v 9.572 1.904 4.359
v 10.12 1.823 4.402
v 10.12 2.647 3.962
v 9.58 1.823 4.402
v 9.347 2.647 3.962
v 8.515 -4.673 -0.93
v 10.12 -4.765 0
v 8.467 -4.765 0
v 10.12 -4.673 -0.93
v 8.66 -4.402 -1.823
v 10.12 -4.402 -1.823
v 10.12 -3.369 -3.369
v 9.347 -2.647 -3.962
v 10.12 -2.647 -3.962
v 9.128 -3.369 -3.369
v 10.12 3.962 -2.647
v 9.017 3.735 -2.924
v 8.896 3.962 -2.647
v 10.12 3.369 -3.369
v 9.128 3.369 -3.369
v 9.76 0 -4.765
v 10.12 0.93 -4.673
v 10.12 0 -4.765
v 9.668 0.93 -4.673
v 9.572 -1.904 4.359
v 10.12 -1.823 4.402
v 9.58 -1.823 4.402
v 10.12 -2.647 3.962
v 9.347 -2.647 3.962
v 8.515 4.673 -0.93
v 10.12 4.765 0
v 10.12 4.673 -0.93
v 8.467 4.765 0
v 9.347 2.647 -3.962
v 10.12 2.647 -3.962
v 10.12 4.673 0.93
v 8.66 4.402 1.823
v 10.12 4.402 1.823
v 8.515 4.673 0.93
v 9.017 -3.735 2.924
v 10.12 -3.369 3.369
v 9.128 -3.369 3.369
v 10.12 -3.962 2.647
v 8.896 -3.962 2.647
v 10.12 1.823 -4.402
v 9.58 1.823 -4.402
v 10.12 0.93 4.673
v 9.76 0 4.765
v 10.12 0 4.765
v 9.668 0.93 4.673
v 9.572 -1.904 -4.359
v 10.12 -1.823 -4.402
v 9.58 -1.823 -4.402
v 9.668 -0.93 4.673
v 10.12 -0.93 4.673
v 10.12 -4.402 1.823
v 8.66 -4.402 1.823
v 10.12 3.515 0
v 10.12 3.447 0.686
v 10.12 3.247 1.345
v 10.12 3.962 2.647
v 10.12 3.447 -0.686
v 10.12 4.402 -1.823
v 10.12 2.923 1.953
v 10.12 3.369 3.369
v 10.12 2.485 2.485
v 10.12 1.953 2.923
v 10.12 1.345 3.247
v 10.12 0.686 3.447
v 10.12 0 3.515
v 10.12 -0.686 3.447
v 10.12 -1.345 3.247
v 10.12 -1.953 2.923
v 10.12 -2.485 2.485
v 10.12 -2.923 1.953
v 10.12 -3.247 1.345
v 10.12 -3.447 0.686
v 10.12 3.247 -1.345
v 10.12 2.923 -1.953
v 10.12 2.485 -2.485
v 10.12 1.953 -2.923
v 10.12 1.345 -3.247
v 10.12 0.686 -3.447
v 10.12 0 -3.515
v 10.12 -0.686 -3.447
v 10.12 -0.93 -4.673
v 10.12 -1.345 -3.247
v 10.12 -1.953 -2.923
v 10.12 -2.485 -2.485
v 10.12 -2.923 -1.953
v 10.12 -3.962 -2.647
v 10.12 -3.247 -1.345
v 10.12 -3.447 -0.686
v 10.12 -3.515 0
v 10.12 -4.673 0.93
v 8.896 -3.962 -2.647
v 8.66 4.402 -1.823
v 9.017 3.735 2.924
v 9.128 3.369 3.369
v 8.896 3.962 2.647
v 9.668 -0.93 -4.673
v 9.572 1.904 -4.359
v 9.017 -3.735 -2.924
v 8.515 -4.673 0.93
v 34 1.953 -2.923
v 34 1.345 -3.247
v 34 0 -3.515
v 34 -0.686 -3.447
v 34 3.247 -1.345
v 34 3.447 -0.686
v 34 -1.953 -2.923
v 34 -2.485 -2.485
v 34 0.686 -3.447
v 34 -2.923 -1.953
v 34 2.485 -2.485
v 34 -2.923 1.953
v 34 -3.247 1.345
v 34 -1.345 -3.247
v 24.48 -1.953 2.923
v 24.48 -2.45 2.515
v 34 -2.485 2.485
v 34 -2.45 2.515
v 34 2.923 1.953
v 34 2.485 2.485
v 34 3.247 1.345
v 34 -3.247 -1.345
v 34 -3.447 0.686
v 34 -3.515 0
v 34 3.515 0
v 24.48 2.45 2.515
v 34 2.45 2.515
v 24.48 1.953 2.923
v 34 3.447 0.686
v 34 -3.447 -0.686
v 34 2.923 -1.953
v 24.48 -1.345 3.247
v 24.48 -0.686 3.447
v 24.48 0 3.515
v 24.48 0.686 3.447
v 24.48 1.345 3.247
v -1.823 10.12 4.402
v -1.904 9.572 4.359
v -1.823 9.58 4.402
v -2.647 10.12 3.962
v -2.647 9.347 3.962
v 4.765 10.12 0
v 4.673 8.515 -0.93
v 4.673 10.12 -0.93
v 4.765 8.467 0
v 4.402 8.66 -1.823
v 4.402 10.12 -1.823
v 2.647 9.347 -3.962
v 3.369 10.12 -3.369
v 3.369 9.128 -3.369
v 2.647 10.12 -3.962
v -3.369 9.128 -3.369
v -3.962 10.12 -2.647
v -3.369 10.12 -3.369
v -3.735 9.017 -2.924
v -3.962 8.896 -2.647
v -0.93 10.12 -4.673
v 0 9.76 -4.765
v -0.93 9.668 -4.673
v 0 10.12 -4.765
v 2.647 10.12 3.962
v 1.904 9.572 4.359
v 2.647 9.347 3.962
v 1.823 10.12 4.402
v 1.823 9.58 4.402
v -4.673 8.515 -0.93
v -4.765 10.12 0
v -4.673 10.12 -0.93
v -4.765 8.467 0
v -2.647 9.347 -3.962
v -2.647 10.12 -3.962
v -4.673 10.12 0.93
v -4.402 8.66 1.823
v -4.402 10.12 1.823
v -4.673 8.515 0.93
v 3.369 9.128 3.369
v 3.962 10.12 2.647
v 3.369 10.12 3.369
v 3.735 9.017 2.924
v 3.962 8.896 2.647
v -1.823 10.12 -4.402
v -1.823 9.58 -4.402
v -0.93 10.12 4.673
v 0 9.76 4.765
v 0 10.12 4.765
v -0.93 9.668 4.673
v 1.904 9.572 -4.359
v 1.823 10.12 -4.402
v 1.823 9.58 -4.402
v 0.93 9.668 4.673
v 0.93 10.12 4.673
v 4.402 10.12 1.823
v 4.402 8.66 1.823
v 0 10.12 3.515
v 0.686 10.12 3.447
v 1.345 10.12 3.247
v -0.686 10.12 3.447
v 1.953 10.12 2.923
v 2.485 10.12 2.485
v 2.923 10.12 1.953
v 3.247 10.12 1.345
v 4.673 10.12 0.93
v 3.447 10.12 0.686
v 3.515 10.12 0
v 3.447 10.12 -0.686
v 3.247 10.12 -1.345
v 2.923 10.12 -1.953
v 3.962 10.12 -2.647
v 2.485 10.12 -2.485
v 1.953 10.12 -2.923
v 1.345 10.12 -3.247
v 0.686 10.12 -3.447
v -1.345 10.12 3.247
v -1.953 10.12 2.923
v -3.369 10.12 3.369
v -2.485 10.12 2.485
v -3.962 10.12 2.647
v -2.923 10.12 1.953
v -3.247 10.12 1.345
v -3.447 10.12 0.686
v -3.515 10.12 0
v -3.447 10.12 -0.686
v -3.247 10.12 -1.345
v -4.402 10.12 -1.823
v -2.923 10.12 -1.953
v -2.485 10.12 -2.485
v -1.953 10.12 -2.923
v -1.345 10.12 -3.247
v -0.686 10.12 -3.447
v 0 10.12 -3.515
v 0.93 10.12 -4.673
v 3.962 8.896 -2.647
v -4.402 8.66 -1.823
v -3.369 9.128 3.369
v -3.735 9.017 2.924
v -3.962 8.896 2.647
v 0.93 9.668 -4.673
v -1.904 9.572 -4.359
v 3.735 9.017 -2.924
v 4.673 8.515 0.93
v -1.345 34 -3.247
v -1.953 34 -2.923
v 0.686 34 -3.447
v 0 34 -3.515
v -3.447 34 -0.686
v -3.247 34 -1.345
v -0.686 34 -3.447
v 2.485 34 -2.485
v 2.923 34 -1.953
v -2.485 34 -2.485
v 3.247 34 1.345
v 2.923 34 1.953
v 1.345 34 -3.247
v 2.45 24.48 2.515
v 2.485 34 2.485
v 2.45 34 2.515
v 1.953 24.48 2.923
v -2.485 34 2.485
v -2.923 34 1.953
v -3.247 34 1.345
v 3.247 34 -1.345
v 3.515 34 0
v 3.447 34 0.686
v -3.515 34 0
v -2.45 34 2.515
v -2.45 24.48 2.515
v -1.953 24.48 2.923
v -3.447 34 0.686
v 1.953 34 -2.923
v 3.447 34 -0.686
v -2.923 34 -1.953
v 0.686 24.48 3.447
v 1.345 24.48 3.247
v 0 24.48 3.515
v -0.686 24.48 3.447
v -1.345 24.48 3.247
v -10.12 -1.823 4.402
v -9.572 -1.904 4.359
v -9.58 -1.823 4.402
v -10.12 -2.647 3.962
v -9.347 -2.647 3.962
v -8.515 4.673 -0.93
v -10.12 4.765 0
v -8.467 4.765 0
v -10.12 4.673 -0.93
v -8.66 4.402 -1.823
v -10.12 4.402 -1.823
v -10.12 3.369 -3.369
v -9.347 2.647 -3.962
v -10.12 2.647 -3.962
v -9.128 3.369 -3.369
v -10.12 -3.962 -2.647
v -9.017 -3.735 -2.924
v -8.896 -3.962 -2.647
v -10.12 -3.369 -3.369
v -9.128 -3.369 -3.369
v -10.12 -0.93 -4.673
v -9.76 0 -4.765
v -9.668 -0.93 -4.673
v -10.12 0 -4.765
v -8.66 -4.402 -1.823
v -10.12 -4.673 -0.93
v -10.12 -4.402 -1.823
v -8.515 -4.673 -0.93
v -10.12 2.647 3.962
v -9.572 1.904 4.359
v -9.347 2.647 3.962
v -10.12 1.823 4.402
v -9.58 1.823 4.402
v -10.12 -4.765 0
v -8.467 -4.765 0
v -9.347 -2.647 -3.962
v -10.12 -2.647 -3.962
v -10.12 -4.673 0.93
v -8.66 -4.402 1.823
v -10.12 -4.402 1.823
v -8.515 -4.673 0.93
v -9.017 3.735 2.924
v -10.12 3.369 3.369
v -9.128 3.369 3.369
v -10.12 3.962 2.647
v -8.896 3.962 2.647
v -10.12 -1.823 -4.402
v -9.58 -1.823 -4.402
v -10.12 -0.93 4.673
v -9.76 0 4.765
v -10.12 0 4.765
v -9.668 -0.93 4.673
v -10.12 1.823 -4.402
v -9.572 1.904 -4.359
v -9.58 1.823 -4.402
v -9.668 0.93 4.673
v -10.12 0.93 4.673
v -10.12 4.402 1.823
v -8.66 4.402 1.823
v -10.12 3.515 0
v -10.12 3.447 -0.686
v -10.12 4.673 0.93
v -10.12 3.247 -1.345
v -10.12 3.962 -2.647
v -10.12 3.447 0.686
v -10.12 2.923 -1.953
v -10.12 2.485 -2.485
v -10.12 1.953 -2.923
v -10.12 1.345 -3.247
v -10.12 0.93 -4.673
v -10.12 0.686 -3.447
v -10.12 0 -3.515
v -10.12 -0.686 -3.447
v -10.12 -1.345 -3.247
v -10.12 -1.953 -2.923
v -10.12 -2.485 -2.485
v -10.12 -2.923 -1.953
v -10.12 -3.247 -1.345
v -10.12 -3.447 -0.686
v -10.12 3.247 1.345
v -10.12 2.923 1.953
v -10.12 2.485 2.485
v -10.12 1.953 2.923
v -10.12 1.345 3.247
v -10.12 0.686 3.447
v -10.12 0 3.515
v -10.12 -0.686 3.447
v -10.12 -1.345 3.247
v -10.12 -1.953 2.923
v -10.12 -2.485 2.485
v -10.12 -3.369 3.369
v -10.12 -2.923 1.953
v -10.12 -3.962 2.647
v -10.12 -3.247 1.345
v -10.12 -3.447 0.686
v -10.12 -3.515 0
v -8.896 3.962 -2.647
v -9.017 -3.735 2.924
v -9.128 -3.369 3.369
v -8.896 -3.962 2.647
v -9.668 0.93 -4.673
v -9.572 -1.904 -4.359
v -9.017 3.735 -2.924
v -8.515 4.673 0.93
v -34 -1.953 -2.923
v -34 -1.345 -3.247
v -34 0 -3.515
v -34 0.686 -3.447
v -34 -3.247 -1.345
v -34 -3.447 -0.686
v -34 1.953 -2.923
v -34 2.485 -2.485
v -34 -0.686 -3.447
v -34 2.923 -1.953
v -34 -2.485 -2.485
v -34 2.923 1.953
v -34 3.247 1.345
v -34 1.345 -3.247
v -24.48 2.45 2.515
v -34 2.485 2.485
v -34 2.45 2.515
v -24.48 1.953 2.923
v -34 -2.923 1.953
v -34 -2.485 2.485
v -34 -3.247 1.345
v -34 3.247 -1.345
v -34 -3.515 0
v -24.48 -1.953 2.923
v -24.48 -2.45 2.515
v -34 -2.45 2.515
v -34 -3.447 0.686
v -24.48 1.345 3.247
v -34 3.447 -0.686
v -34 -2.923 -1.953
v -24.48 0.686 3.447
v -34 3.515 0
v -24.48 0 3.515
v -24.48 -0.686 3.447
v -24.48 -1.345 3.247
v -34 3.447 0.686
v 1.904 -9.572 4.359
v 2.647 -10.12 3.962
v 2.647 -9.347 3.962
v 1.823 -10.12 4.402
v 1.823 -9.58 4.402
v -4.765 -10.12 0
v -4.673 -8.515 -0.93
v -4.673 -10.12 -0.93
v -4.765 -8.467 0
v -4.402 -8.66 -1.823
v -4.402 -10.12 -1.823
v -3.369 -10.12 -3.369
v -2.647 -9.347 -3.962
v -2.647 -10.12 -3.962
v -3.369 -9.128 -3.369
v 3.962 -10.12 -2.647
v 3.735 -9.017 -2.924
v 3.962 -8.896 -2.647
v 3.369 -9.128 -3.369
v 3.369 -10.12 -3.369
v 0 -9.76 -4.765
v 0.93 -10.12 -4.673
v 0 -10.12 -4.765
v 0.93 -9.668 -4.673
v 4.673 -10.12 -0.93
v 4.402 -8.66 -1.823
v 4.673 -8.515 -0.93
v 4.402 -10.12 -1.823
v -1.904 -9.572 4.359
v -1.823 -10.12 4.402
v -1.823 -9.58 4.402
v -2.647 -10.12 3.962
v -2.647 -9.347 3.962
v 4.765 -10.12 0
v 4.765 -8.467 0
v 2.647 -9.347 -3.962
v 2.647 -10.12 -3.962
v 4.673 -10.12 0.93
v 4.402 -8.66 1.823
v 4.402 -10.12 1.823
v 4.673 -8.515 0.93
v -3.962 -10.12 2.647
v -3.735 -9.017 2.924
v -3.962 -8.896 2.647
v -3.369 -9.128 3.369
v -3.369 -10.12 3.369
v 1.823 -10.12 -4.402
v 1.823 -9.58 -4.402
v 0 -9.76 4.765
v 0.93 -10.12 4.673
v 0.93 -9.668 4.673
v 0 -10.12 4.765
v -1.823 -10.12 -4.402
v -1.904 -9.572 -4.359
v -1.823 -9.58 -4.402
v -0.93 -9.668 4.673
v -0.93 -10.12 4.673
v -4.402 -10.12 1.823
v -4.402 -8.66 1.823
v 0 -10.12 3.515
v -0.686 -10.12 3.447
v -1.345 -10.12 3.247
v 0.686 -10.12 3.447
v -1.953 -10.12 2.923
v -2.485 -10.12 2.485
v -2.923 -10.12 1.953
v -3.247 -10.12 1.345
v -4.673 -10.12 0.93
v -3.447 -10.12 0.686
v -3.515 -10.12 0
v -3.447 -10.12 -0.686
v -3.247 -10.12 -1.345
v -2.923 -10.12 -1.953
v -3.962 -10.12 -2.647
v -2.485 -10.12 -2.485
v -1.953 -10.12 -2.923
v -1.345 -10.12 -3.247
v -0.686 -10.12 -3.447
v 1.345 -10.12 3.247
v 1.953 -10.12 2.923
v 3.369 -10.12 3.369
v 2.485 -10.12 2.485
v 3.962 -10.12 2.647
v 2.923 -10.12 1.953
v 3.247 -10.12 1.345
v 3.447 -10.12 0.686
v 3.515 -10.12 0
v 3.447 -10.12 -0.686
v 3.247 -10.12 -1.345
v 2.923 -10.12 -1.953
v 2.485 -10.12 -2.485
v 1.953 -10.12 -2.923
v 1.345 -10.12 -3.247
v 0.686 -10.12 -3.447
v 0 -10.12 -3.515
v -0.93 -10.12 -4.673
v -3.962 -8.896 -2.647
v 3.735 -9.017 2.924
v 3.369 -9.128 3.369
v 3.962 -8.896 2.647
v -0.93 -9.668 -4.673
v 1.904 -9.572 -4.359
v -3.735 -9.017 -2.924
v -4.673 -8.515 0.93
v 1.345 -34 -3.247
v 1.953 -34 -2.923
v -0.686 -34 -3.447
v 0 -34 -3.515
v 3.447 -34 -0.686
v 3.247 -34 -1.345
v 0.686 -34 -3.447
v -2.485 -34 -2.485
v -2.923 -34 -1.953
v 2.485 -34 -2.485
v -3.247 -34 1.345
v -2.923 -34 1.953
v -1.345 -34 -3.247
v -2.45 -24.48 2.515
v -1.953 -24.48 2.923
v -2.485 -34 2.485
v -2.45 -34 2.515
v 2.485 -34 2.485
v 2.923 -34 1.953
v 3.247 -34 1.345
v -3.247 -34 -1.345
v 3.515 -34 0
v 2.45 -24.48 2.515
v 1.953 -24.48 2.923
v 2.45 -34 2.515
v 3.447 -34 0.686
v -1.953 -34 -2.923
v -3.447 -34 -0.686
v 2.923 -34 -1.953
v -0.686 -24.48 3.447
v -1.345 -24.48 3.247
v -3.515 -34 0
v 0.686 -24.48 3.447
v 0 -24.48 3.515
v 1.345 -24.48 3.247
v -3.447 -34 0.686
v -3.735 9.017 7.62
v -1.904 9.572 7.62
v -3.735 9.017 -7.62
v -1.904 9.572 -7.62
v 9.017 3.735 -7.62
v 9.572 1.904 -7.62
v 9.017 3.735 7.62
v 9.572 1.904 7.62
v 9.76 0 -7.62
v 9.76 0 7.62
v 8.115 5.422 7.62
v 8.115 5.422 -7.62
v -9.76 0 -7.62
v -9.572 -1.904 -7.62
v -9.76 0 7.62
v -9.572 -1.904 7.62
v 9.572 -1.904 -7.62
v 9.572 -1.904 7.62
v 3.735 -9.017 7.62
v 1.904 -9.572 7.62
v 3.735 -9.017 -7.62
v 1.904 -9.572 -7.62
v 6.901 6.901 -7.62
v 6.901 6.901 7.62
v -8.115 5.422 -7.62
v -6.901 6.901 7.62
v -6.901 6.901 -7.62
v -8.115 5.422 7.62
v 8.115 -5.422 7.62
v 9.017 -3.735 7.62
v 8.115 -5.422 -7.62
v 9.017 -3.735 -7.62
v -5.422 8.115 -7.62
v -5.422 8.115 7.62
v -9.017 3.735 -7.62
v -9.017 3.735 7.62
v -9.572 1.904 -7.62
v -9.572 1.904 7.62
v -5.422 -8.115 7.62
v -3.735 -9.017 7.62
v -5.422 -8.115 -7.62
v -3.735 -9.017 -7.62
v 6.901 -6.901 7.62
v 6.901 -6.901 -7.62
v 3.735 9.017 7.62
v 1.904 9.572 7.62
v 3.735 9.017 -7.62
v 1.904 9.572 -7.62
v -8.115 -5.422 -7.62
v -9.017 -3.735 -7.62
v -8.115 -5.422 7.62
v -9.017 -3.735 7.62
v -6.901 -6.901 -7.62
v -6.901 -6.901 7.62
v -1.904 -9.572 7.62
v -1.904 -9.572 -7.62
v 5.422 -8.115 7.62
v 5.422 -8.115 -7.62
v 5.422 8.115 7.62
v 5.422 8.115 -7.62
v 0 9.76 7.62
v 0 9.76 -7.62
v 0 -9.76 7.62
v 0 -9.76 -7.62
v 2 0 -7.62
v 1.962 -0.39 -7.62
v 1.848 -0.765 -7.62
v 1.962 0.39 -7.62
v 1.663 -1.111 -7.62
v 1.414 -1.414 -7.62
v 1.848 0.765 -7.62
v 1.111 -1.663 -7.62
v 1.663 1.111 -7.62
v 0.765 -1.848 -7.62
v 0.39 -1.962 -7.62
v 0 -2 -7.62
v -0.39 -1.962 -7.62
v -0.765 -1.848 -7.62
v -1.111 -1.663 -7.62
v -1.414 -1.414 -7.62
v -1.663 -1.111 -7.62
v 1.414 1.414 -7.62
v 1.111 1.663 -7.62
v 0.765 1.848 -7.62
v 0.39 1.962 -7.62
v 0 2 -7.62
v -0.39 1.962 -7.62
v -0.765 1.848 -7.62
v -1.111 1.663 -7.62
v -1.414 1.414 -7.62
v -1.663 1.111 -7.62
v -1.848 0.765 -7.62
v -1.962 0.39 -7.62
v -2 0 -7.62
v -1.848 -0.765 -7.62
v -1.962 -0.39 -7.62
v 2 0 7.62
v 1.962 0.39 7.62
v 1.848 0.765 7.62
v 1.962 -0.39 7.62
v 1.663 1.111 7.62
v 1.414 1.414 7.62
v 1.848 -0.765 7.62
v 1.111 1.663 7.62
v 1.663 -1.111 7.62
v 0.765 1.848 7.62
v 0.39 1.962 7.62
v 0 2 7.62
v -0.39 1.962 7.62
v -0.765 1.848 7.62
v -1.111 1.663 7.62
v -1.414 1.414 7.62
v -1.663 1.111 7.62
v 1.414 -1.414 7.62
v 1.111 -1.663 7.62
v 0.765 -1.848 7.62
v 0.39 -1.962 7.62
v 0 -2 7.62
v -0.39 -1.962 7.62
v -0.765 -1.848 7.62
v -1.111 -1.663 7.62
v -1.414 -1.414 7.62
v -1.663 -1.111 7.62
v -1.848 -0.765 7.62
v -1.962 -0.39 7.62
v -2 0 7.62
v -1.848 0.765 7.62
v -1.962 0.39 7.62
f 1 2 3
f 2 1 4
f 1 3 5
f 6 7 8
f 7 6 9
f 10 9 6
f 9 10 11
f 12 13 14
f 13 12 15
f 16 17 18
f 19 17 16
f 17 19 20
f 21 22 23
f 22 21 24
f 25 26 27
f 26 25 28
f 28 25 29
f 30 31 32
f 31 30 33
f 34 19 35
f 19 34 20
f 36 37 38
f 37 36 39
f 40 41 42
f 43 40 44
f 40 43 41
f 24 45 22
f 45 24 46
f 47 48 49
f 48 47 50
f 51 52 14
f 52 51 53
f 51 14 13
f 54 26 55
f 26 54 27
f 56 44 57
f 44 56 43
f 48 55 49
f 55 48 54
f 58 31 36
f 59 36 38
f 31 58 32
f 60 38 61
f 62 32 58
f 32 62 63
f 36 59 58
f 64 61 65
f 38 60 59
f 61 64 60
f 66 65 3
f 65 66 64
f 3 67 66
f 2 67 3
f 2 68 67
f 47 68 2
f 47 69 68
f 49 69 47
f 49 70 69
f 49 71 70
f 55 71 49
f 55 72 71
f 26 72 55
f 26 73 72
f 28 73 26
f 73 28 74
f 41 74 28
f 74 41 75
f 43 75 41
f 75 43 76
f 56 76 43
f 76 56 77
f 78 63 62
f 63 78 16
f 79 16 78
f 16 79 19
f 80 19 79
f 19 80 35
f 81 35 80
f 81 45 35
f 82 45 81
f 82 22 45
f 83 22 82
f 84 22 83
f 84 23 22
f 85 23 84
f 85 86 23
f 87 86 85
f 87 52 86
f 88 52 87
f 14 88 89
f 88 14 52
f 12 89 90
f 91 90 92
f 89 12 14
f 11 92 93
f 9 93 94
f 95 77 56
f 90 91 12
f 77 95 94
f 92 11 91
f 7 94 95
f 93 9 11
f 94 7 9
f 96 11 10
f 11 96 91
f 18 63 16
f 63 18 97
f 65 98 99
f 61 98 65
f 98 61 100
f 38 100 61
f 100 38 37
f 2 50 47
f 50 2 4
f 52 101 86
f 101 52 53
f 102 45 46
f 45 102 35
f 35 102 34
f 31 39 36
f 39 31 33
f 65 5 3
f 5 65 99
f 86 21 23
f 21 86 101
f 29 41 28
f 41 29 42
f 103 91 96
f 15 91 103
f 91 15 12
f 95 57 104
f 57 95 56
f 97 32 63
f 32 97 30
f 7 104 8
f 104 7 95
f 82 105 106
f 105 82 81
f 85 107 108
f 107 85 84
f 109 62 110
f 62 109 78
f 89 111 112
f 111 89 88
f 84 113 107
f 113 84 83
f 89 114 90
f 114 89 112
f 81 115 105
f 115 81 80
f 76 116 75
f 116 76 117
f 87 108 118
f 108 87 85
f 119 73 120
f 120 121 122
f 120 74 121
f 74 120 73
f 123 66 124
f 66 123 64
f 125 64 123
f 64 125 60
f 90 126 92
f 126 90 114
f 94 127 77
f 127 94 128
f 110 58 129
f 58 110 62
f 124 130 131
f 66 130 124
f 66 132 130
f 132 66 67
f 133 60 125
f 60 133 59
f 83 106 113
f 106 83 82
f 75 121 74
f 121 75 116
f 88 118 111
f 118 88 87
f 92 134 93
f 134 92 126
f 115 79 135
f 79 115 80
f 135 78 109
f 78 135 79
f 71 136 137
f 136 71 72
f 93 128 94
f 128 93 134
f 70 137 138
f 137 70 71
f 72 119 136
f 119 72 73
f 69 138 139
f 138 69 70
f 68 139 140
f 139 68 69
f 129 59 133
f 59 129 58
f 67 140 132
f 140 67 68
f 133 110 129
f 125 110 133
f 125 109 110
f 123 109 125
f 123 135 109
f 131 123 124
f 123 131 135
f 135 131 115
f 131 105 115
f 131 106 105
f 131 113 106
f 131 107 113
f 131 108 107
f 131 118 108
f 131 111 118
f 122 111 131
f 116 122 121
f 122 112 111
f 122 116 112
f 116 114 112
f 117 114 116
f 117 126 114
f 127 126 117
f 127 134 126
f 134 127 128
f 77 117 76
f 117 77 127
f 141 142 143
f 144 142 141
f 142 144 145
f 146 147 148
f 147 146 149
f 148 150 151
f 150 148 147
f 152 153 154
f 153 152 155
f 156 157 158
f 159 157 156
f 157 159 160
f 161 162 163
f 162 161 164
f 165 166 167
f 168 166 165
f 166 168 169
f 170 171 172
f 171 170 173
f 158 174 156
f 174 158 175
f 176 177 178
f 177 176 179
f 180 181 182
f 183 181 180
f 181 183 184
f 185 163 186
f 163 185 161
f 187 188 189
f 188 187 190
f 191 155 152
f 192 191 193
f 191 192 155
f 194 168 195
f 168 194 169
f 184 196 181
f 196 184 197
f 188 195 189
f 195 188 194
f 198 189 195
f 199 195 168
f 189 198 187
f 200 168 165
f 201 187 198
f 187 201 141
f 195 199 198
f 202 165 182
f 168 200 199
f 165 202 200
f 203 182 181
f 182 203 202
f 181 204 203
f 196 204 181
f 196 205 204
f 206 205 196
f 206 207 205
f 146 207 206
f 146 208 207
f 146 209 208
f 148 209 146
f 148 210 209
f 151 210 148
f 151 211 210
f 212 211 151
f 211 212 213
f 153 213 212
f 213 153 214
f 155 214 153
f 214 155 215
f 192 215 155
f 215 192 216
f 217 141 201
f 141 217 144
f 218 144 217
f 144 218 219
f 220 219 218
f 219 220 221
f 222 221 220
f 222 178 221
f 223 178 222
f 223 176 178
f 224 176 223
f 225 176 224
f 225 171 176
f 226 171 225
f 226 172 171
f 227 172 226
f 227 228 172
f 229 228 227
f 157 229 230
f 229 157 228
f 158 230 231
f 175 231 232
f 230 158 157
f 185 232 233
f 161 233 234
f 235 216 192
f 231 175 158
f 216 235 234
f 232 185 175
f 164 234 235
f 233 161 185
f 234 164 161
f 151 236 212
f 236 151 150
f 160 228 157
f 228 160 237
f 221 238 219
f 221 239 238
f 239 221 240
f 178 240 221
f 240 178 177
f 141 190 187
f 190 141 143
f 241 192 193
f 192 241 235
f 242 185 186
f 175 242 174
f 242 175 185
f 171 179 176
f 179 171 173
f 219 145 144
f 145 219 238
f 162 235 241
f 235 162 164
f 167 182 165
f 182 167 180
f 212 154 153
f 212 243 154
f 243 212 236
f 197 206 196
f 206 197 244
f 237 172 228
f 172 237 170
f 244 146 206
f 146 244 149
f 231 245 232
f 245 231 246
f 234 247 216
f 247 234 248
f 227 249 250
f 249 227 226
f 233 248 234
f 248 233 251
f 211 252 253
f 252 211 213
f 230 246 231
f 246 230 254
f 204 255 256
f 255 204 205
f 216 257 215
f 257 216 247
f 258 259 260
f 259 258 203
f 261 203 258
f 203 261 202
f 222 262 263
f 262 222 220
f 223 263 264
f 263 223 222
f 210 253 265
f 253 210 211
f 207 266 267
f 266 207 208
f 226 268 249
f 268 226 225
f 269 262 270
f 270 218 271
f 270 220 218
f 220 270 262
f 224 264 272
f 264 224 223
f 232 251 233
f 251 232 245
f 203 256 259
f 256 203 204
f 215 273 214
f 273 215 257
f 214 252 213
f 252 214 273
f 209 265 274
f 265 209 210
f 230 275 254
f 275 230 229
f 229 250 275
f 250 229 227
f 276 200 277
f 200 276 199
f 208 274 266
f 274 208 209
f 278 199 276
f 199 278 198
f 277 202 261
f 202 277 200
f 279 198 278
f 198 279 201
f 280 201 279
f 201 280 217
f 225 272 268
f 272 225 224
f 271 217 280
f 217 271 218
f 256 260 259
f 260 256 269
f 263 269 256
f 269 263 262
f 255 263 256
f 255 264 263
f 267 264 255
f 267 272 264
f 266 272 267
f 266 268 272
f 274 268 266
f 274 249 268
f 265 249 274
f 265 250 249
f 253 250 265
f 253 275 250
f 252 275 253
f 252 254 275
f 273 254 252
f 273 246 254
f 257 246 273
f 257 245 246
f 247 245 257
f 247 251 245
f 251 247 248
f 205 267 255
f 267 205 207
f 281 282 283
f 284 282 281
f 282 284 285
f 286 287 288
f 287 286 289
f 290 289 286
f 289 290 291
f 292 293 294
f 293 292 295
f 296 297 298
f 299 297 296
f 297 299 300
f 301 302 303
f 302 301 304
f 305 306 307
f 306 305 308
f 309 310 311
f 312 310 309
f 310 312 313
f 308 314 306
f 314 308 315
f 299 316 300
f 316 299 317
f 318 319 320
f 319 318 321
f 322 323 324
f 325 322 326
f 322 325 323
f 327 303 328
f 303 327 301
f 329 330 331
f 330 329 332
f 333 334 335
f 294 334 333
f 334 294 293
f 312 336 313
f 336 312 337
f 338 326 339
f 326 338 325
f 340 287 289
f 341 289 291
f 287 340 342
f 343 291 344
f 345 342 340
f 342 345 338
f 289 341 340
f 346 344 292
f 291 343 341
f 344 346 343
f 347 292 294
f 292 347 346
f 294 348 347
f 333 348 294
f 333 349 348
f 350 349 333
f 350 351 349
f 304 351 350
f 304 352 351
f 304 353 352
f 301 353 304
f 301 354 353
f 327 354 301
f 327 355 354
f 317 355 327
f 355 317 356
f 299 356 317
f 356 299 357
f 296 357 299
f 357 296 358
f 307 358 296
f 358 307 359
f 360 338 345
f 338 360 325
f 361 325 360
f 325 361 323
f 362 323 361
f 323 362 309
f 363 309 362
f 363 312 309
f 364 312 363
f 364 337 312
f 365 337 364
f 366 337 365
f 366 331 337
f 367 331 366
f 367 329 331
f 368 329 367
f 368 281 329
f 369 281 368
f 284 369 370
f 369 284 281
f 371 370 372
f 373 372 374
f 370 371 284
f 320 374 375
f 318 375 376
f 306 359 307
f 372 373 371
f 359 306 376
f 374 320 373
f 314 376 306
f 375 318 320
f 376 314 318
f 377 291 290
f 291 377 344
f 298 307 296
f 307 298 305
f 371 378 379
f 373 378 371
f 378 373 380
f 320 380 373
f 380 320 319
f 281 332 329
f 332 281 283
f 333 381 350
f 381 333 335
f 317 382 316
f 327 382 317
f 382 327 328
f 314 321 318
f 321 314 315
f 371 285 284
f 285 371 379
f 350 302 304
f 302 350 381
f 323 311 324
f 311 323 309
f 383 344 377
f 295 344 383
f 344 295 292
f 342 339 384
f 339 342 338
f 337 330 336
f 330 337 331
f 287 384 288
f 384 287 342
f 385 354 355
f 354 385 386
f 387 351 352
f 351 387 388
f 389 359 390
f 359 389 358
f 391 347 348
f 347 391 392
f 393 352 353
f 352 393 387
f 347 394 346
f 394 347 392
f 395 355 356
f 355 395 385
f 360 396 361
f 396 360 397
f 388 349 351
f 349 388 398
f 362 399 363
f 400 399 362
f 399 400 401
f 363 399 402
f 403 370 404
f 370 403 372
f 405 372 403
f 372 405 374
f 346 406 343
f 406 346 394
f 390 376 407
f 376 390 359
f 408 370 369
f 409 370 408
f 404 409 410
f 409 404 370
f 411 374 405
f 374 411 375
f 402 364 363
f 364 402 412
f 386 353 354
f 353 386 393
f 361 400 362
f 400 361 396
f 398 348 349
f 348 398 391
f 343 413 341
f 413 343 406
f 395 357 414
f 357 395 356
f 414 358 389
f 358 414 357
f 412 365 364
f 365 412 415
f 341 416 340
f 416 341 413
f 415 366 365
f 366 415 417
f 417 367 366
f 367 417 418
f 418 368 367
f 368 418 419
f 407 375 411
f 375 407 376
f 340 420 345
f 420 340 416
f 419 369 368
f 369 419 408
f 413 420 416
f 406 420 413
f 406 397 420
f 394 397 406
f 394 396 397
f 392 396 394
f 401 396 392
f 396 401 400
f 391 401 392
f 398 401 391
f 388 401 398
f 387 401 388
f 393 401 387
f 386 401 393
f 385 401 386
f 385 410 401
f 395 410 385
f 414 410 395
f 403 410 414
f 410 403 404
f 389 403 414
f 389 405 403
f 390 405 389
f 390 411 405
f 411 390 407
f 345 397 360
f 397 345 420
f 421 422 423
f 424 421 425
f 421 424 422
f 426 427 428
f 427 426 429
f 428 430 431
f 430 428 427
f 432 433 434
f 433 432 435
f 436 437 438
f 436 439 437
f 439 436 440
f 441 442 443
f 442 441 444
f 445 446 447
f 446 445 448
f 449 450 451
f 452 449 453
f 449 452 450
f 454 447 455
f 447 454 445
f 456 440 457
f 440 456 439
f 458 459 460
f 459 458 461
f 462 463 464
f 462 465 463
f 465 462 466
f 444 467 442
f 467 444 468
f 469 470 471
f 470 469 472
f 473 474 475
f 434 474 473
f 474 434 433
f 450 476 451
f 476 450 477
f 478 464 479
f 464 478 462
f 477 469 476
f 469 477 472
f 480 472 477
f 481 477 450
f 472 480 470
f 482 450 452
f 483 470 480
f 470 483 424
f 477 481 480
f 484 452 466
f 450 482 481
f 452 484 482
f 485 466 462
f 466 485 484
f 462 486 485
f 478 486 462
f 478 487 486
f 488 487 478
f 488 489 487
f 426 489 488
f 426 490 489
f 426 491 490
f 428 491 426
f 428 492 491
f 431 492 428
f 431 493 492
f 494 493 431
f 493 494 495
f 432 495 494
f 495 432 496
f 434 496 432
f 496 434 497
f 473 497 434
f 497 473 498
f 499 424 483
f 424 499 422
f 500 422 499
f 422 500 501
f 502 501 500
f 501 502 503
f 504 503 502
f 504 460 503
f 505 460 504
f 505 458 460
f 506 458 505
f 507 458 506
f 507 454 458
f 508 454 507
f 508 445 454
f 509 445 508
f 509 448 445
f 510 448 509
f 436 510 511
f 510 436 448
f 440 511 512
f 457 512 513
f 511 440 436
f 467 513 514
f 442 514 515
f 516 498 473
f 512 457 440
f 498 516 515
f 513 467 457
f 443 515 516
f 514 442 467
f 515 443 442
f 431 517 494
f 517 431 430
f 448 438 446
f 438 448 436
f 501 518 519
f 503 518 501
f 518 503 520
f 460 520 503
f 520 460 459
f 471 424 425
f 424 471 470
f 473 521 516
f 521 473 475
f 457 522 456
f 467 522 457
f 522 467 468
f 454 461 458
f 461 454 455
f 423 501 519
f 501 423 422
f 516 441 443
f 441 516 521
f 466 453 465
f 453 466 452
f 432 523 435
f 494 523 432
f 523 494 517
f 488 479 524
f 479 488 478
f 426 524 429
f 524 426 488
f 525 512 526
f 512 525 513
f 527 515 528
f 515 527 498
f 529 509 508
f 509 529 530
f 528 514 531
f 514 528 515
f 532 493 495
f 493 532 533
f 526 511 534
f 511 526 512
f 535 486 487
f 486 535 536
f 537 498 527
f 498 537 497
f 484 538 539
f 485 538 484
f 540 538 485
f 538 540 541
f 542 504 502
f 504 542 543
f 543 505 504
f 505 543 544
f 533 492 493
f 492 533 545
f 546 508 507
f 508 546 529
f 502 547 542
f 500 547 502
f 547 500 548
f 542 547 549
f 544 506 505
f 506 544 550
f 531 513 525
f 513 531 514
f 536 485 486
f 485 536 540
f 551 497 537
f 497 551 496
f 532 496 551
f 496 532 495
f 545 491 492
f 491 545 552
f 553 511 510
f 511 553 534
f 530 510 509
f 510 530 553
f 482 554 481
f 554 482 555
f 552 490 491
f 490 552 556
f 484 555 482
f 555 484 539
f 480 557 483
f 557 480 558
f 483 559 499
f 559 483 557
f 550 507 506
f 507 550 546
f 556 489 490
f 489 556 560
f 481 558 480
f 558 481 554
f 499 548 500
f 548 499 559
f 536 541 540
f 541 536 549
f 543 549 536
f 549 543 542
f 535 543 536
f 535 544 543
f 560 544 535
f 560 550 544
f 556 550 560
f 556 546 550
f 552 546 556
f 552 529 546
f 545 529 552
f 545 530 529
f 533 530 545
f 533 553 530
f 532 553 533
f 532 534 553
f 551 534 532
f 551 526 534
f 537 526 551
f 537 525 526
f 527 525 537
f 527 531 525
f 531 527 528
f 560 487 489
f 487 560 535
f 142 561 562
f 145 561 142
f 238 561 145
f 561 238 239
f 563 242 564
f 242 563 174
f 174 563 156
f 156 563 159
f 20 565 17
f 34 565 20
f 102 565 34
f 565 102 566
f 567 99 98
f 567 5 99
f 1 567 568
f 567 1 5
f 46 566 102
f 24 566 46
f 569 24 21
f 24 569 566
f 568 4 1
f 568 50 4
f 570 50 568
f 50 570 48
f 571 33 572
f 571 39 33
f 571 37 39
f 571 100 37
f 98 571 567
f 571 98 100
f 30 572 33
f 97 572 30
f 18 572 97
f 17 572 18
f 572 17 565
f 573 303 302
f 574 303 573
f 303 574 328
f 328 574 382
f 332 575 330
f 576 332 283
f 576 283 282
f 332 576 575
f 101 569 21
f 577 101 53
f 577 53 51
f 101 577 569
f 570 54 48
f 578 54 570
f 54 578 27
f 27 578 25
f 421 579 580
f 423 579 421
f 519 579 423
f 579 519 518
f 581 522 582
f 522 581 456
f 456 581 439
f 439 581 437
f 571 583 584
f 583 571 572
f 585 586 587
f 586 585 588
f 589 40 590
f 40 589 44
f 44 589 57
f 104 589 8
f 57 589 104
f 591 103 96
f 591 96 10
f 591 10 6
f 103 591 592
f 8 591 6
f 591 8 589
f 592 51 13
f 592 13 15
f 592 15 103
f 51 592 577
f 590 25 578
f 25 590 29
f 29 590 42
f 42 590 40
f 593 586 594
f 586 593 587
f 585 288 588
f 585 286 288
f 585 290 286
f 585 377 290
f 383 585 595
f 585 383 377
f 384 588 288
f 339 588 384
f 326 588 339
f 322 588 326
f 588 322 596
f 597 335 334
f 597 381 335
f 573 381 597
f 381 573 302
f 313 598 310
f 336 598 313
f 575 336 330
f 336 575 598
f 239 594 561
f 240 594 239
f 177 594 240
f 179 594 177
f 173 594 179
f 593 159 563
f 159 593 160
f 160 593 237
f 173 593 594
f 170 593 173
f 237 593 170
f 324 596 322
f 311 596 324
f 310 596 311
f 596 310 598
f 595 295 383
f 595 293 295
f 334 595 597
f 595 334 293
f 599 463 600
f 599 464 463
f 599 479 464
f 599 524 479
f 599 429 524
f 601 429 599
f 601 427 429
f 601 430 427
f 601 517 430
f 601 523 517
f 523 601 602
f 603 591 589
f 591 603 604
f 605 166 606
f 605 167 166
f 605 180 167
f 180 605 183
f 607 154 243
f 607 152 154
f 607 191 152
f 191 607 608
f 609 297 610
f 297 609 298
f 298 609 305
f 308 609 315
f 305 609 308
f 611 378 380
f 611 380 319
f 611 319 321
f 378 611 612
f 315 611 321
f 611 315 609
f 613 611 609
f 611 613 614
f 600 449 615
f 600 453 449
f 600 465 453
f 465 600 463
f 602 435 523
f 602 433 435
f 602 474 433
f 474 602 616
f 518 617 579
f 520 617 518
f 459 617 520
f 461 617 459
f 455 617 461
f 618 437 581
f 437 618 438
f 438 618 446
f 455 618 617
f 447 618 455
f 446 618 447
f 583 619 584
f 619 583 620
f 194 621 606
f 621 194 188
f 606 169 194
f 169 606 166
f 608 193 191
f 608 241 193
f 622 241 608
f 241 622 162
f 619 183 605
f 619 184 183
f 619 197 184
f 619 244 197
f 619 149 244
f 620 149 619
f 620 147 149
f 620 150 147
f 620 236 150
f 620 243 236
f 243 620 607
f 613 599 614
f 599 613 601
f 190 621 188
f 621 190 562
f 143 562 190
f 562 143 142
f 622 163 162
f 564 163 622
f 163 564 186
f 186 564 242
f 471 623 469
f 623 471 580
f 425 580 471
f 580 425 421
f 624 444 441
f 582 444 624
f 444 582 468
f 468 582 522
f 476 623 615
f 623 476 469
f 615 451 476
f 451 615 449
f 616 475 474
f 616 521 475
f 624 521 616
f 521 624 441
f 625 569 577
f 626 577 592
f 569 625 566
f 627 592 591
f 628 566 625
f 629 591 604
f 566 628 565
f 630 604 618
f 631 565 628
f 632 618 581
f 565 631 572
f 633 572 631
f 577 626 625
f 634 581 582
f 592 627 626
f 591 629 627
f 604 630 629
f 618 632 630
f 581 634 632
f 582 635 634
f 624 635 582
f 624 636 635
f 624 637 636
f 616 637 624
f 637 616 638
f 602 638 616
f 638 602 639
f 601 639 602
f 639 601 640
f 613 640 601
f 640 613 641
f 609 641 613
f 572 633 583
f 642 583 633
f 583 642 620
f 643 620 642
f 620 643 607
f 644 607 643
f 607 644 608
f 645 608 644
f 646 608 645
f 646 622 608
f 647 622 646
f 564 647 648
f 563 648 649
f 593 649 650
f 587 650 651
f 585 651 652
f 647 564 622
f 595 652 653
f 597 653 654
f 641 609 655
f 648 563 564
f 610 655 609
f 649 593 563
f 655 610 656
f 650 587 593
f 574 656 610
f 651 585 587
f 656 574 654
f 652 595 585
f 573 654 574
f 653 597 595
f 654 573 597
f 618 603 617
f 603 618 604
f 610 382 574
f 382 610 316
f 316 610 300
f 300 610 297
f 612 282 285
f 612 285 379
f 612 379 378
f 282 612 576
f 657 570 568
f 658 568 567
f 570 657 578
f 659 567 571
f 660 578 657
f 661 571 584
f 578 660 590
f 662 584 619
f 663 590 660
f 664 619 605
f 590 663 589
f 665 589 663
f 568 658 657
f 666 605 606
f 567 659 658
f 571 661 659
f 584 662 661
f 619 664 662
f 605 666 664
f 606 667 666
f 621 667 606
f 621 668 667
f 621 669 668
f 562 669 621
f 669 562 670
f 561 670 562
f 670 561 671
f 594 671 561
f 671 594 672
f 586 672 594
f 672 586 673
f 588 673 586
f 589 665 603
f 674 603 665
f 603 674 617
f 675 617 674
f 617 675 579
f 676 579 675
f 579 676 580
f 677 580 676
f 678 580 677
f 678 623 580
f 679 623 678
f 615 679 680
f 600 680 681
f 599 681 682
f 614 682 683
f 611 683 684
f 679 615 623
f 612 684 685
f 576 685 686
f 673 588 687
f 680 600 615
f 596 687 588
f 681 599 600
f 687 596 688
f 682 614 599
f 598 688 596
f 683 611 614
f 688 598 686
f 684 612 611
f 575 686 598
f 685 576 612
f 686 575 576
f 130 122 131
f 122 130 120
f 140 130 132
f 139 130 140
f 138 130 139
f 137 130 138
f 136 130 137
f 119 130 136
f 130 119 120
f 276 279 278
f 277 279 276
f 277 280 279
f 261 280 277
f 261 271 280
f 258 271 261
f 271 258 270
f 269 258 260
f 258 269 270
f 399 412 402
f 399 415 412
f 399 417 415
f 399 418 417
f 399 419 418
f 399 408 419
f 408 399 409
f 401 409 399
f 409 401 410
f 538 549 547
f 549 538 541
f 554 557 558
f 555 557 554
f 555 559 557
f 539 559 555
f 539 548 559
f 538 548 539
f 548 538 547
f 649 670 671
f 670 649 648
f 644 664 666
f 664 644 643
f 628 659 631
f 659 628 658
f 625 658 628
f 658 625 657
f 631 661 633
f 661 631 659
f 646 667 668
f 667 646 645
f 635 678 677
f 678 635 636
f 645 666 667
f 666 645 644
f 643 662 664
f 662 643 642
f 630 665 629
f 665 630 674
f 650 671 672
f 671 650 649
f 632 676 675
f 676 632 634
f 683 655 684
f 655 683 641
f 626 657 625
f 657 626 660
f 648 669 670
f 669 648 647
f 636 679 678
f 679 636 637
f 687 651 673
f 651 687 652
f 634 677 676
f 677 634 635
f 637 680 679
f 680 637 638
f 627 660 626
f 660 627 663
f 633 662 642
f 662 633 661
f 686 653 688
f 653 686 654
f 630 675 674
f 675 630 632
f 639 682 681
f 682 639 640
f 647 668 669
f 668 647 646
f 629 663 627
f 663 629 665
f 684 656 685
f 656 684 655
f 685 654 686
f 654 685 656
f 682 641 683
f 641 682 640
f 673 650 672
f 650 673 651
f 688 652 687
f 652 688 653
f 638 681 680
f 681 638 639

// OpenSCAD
$fn = 32;

// ----------------------------------------------------------------------
// Cardan cross: 68 mm span, 9.53 mm trunnions
// ----------------------------------------------------------------------

// --- parameters (mm) ---
journal_d = 9.53;         // trunnion diameter
arm_len = 34;             // trunnion length from the centre
step_r = 3.24;            // step position from the centre
step_d = 7.03;            // journal diameter after the step
hub_d = 19.52;            // hub diameter
hub_h = 15.24;            // hub height
bore_d = 4;               // hub bore
flat_d = 1;               // depth of the journal flat
flat_len = 9.52;          // length of the journal flat

difference() {
  union() {
    /* hub along the joint axis */
    cylinder(h = hub_h, d = hub_d, center = true);
    for (a = [0 : 90 : 270]) rotate([0, 0, a]) {
      /* trunnion, sunk into the hub */
      translate([hub_d / 4, 0, 0]) rotate([0, 90, 0]) cylinder(h = step_r + 2, d = journal_d);
      /* stepped journal out to the tip */
      translate([step_r - 0.5, 0, 0]) rotate([0, 90, 0]) cylinder(h = arm_len + 0.5 - step_r, d = step_d);
    }
  }
  /* lubrication bore through the hub, 2.5 mm clear on both sides */
  translate([0, 0, -hub_h / 2 - 2.5]) cylinder(h = hub_h + 5, d = bore_d);
  /* machined flat on each journal tip */
  for (a = [0 : 90 : 270]) rotate([0, 0, a]) {
    translate([arm_len - flat_len, -step_d, step_d / 2 - flat_d]) cube([flat_len + 0.5, 2 * step_d, flat_d + 2.5]);
  }
}
